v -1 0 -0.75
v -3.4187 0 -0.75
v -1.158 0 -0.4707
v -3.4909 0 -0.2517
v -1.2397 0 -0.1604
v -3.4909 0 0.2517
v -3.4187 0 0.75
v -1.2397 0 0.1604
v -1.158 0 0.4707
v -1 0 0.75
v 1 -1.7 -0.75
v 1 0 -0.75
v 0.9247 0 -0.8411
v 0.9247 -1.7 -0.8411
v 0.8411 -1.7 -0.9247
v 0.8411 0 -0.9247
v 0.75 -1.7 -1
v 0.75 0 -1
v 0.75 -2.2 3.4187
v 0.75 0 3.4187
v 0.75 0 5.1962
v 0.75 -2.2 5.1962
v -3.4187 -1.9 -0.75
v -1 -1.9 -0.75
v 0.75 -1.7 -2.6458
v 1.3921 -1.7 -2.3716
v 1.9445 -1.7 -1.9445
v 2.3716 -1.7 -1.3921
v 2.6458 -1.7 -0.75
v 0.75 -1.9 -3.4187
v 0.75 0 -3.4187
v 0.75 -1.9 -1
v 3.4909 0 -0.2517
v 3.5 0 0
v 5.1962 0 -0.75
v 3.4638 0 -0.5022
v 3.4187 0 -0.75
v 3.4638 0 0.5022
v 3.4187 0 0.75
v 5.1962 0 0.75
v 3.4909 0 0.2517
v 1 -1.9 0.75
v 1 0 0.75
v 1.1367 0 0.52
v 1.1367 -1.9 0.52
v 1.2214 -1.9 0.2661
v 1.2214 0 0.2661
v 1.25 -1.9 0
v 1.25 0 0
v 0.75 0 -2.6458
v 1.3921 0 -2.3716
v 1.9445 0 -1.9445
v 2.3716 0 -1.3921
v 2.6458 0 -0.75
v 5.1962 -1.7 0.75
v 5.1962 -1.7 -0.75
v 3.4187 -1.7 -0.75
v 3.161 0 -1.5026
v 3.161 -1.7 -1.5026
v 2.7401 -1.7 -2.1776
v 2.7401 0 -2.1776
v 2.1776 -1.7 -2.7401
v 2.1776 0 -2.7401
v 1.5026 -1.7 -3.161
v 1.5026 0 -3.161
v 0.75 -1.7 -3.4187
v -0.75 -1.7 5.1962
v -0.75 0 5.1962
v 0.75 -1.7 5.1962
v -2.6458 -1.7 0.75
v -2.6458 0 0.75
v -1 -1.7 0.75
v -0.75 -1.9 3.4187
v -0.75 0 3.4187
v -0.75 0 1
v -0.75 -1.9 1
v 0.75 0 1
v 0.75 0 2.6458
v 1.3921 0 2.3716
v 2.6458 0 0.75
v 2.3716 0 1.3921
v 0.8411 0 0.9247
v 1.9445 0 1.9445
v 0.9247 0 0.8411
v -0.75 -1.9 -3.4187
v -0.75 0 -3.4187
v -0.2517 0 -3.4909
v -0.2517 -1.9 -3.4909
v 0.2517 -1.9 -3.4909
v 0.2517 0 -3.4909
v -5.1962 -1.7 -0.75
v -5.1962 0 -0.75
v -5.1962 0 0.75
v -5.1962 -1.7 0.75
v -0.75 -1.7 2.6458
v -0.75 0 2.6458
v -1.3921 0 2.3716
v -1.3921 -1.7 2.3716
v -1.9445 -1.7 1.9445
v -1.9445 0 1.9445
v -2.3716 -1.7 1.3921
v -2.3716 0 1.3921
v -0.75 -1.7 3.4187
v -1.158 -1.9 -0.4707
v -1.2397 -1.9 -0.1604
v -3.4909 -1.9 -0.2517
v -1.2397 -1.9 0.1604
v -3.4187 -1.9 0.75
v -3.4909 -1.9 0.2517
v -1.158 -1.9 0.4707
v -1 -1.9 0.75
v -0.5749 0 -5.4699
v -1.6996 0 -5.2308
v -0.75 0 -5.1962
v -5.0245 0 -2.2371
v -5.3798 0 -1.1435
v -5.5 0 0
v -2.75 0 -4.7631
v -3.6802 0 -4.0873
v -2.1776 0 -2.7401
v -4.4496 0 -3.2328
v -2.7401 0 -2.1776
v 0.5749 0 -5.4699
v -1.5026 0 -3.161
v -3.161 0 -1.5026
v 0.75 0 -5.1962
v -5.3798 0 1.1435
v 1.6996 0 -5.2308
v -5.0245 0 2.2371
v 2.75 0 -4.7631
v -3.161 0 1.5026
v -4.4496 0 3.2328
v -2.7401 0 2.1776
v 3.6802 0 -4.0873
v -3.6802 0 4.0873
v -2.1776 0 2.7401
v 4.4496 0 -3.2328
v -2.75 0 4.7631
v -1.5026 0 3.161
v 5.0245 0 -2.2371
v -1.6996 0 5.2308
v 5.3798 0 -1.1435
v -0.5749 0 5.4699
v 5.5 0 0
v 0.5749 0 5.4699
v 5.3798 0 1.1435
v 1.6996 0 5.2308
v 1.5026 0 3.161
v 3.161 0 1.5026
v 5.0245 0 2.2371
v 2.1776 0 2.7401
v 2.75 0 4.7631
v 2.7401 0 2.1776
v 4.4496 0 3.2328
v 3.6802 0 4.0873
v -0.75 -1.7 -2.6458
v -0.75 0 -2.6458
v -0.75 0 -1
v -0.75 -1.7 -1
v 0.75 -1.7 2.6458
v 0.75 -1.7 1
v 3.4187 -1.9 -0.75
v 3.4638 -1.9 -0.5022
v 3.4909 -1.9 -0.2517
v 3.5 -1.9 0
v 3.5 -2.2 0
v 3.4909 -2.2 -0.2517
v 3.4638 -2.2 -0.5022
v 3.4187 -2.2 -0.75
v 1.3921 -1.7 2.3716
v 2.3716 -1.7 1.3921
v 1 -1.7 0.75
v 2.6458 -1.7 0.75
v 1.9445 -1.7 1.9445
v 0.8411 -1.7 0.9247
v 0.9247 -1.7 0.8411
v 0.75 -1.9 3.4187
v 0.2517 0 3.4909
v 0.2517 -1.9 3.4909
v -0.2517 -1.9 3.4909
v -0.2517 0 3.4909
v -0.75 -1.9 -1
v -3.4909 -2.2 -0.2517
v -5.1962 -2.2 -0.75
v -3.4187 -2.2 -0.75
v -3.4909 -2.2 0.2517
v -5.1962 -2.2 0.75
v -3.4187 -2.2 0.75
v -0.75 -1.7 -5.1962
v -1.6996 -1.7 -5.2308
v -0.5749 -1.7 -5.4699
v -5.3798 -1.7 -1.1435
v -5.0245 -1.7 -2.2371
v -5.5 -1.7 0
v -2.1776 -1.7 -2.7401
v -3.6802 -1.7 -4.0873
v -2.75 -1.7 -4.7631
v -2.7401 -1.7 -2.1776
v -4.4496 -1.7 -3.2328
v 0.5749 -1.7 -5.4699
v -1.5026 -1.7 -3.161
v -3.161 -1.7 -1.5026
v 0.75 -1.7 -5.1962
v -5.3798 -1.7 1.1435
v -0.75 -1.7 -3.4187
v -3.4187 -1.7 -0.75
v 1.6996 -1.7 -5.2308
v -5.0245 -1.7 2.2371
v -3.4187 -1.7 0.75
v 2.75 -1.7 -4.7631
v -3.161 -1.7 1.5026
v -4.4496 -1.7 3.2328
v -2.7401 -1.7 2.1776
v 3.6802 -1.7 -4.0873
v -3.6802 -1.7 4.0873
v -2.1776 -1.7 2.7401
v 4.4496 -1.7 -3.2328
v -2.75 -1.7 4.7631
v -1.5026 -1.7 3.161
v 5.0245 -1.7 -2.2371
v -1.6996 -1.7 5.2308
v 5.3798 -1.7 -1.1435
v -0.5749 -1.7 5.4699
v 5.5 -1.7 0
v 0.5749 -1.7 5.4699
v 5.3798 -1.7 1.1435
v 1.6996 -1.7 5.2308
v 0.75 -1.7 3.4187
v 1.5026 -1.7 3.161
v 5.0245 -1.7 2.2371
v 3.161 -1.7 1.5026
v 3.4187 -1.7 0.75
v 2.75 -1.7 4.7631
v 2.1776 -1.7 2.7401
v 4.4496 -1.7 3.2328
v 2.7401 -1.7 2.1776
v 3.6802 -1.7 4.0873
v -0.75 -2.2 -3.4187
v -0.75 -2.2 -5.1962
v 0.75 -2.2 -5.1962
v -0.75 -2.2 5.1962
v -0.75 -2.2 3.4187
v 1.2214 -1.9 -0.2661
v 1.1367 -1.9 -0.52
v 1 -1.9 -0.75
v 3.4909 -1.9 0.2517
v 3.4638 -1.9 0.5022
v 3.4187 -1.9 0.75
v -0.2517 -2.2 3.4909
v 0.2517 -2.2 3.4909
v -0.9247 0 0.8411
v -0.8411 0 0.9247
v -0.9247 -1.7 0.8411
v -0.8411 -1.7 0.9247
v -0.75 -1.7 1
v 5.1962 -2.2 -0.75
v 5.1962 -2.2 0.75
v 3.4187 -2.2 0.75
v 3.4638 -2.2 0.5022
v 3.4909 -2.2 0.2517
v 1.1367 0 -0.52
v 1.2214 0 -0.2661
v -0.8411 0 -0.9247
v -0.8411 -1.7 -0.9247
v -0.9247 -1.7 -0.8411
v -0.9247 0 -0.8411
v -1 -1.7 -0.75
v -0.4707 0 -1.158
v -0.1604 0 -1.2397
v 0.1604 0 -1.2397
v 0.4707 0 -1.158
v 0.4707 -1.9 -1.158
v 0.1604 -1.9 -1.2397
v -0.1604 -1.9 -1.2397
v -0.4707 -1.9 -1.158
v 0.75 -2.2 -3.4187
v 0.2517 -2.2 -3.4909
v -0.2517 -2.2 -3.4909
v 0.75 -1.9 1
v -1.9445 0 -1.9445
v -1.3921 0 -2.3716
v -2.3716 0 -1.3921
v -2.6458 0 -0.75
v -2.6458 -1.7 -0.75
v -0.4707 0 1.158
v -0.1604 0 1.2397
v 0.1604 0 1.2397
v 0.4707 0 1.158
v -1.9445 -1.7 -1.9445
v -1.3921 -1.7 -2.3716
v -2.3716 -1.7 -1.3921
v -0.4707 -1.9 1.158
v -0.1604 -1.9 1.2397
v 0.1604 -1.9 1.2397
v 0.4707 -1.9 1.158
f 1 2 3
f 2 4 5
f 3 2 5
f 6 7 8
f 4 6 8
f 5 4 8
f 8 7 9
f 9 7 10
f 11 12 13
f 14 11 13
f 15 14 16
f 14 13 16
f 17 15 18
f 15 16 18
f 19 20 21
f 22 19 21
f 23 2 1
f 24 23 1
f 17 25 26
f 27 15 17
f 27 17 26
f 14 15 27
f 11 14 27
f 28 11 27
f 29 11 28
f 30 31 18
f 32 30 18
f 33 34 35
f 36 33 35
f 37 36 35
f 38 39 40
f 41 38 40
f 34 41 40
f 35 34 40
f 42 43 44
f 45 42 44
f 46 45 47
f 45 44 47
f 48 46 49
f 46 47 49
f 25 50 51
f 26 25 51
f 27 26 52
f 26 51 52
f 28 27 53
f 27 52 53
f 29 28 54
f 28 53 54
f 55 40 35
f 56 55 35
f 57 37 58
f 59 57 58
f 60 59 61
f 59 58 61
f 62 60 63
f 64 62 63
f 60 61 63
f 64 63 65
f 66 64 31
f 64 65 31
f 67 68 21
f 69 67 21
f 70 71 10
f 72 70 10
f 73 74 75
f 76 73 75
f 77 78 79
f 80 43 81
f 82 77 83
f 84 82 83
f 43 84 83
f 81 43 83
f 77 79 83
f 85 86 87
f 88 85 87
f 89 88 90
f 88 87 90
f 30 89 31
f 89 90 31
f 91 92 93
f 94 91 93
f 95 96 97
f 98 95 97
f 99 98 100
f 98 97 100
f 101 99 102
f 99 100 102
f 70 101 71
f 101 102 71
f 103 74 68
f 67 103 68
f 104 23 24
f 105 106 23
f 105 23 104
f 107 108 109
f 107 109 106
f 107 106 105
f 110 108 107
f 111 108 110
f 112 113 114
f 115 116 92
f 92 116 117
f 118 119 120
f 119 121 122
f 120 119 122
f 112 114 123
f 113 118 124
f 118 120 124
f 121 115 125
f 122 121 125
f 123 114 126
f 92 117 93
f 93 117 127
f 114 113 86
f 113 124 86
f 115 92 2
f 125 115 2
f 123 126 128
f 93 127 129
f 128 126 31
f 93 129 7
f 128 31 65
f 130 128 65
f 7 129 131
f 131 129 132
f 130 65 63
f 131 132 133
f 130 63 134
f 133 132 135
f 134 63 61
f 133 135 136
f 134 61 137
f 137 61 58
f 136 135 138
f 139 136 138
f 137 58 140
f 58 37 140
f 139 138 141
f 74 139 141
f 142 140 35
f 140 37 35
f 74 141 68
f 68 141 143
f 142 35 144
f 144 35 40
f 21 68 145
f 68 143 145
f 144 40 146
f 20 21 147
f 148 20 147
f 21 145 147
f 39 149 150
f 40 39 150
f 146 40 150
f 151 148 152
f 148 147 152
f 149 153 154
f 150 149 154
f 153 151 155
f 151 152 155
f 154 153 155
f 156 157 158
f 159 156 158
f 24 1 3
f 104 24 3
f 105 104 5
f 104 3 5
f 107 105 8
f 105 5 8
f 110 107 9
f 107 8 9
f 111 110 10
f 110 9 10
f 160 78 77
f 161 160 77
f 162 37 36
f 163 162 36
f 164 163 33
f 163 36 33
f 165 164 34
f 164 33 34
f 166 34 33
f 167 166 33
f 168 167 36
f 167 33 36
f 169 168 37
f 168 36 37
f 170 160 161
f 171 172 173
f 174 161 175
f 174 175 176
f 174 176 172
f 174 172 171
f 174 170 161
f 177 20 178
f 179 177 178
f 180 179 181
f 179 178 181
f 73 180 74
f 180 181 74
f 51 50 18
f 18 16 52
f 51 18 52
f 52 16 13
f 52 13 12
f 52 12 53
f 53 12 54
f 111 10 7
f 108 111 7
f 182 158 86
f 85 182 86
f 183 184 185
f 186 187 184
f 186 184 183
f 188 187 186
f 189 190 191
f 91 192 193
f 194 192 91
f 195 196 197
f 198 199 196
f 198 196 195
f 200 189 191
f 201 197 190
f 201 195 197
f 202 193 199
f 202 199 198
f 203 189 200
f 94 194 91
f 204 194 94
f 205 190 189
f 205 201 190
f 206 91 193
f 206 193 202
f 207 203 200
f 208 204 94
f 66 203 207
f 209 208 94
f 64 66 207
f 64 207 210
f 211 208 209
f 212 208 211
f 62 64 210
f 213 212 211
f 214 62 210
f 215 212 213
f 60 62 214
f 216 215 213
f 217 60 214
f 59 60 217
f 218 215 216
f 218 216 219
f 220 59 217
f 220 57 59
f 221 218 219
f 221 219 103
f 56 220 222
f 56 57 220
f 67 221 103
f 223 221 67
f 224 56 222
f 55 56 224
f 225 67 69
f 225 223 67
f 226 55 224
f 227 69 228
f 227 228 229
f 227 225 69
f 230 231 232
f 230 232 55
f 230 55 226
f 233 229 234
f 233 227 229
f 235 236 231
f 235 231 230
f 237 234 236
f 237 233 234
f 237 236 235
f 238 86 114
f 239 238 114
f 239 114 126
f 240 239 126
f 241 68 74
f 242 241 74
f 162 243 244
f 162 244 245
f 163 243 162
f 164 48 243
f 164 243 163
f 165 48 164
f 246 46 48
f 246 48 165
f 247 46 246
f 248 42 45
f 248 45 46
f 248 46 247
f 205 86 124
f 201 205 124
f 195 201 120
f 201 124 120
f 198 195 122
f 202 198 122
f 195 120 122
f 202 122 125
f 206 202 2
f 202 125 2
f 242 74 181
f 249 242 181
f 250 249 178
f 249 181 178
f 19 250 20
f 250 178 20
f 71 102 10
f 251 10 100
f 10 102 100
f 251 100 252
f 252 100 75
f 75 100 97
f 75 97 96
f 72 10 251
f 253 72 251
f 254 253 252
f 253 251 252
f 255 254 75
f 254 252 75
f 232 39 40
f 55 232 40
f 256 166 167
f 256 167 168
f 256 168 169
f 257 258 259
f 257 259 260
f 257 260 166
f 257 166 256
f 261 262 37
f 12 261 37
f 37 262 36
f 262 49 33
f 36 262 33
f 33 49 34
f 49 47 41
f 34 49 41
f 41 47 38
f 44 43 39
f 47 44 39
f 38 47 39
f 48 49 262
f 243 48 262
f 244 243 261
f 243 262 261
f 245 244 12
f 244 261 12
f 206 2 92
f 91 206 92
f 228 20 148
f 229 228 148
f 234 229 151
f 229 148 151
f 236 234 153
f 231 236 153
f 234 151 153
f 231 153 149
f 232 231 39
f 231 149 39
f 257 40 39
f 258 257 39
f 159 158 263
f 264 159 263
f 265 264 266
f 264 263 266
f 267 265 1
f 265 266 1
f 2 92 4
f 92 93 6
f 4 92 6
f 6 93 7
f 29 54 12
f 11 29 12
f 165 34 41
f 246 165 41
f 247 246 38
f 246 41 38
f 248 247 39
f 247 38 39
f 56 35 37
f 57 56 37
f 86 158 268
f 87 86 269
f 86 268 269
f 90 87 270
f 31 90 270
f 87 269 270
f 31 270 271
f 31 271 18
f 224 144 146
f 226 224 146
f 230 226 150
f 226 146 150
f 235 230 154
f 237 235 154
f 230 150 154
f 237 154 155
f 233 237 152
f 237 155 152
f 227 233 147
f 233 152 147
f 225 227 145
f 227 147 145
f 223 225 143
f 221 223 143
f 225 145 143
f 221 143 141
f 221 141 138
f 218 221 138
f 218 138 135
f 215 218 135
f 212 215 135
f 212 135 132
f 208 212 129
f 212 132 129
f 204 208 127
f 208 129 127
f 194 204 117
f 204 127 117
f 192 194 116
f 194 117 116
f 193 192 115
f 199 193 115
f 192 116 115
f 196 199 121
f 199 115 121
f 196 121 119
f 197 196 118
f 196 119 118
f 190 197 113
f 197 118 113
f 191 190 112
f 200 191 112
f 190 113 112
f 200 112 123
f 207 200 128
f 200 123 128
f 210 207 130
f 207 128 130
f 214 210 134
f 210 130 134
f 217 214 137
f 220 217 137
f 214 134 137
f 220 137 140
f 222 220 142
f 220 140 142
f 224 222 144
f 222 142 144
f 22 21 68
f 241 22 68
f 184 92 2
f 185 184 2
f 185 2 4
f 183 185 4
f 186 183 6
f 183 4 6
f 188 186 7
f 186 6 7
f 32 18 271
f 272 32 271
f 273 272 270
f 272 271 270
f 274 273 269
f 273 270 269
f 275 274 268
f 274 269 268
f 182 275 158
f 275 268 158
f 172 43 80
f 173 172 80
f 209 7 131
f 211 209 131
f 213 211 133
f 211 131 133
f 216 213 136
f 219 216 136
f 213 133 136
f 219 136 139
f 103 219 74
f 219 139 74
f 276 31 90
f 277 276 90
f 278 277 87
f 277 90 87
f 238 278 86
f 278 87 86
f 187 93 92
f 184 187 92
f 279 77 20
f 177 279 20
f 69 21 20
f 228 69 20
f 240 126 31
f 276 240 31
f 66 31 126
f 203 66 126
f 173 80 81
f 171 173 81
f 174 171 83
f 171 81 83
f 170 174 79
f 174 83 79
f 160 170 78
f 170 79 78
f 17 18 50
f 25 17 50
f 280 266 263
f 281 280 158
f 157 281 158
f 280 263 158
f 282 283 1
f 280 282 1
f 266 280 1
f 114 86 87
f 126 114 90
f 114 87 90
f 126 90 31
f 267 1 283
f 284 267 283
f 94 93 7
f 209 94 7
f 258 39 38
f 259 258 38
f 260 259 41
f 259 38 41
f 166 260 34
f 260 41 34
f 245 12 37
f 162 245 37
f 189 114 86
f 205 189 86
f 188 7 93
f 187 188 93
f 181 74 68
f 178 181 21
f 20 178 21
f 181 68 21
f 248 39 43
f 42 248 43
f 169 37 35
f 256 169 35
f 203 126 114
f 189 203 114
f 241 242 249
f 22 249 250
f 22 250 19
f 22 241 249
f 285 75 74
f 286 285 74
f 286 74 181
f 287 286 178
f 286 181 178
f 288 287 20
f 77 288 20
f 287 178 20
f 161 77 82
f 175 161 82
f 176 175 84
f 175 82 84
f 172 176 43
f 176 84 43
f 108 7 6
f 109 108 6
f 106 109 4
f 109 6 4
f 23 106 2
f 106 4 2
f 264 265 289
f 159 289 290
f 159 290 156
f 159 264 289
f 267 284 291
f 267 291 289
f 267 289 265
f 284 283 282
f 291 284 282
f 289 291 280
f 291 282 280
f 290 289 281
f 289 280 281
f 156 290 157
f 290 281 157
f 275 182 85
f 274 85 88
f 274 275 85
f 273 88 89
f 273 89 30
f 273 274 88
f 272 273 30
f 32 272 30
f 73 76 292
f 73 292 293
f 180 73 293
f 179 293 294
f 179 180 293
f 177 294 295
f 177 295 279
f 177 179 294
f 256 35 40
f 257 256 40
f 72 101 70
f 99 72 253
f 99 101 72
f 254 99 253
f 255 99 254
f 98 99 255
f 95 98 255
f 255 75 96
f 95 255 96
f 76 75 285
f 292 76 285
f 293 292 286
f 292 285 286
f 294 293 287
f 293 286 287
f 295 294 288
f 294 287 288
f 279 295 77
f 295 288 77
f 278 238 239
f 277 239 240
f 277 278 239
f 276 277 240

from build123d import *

# Parameters (mm, degrees)
F1_DEPTH = 1.7
F0_R     = 5.5
F2_DEPTH = 1.9
F3_DEPTH = 2.2


with BuildPart() as f1:
    # F0 (on Front) → F1 (new body)
    with BuildSketch(Plane.XZ):
        with BuildLine():
            ThreePointArc((0.75, 1), (0.8838834765, 0.8838834765), (1, 0.75))
            Line((1, 0.75), (2.6457513111, 0.75))
            ThreePointArc((2.6457513111, 0.75), (1.9445436483, 1.9445436483), (0.75, 2.6457513111))
            Line((0.75, 2.6457513111), (0.75, 1))
        make_face()
    extrude(amount=F1_DEPTH)


with BuildPart() as f1b:
    # F0 (on Front) → F1, piece 2 (new body)
    with BuildSketch(Plane.XZ):
        Circle(F0_R)
        with BuildLine():
            ThreePointArc((0.75, 5.1961524227), (3.7123106012, 3.7123106012), (5.1961524227, 0.75))
            ThreePointArc((5.1961524227, 0.75), (5.236520802, 0.3759652782), (5.25, 0))
            ThreePointArc((5.25, 0), (5.236520802, -0.3759652782), (5.1961524227, -0.75))
            ThreePointArc((5.1961524227, -0.75), (3.7123106012, -3.7123106012), (0.75, -5.1961524227))
            ThreePointArc((0.75, -5.1961524227), (0, -5.25), (-0.75, -5.1961524227))
            ThreePointArc((-0.75, -5.1961524227), (-3.7123106012, -3.7123106012), (-5.1961524227, -0.75))
            ThreePointArc((-5.1961524227, -0.75), (-5.25, 0), (-5.1961524227, 0.75))
            ThreePointArc((-5.1961524227, 0.75), (-3.7123106012, 3.7123106012), (-0.75, 5.1961524227))
            ThreePointArc((-0.75, 5.1961524227), (0, 5.25), (0.75, 5.1961524227))
        make_face(mode=Mode.SUBTRACT)
        with BuildLine():
            ThreePointArc((0.75, 3.4186985828), (2.4748737342, 2.4748737342), (3.4186985828, 0.75))
            Line((3.4186985828, 0.75), (5.1961524227, 0.75))
            ThreePointArc((5.1961524227, 0.75), (3.7123106012, 3.7123106012), (0.75, 5.1961524227))
            Line((0.75, 5.1961524227), (0.75, 3.4186985828))
        make_face()
        with BuildLine():
            Line((-0.75, -5.1961524227), (-0.75, -3.4186985828))
            ThreePointArc((-0.75, -3.4186985828), (-2.4748737342, -2.4748737342), (-3.4186985828, -0.75))
            Line((-3.4186985828, -0.75), (-5.1961524227, -0.75))
            ThreePointArc((-5.1961524227, -0.75), (-3.7123106012, -3.7123106012), (-0.75, -5.1961524227))
        make_face()
        with BuildLine():
            ThreePointArc((-3.4186985828, 0.75), (-2.4748737342, 2.4748737342), (-0.75, 3.4186985828))
            Line((-0.75, 3.4186985828), (-0.75, 5.1961524227))
            ThreePointArc((-0.75, 5.1961524227), (-3.7123106012, 3.7123106012), (-5.1961524227, 0.75))
            Line((-5.1961524227, 0.75), (-3.4186985828, 0.75))
        make_face()
        with BuildLine():
            Line((5.1961524227, -0.75), (3.4186985828, -0.75))
            ThreePointArc((3.4186985828, -0.75), (2.4748737342, -2.4748737342), (0.75, -3.4186985828))
            Line((0.75, -3.4186985828), (0.75, -5.1961524227))
            ThreePointArc((0.75, -5.1961524227), (3.7123106012, -3.7123106012), (5.1961524227, -0.75))
        make_face()
        with BuildLine():
            Line((-0.75, 5.1961524227), (0.75, 5.1961524227))
            ThreePointArc((0.75, 5.1961524227), (0, 5.25), (-0.75, 5.1961524227))
        make_face()
        with BuildLine():
            ThreePointArc((-0.75, -5.1961524227), (0, -5.25), (0.75, -5.1961524227))
            Line((0.75, -5.1961524227), (-0.75, -5.1961524227))
        make_face()
        with BuildLine():
            ThreePointArc((5.25, 0), (5.236520802, 0.3759652782), (5.1961524227, 0.75))
            Line((5.1961524227, 0.75), (5.1961524227, -0.75))
            ThreePointArc((5.1961524227, -0.75), (5.236520802, -0.3759652782), (5.25, 0))
        make_face()
        with BuildLine():
            Line((-5.1961524227, -0.75), (-5.1961524227, 0.75))
            ThreePointArc((-5.1961524227, 0.75), (-5.25, 0), (-5.1961524227, -0.75))
        make_face()
    extrude(amount=F1_DEPTH)


with BuildPart() as f1c:
    # F0 (on Front) → F1, piece 3 (new body)
    with BuildSketch(Plane.XZ):
        with BuildLine():
            ThreePointArc((-1, 0.75), (-0.8838834765, 0.8838834765), (-0.75, 1))
            Line((-0.75, 1), (-0.75, 2.6457513111))
            ThreePointArc((-0.75, 2.6457513111), (-1.9445436483, 1.9445436483), (-2.6457513111, 0.75))
            Line((-2.6457513111, 0.75), (-1, 0.75))
        make_face()
    extrude(amount=F1_DEPTH)


with BuildPart() as f1d:
    # F0 (on Front) → F1, piece 4 (new body)
    with BuildSketch(Plane.XZ):
        with BuildLine():
            Line((-0.75, -2.6457513111), (-0.75, -1))
            ThreePointArc((-0.75, -1), (-0.8838834765, -0.8838834765), (-1, -0.75))
            Line((-1, -0.75), (-2.6457513111, -0.75))
            ThreePointArc((-2.6457513111, -0.75), (-1.9445436483, -1.9445436483), (-0.75, -2.6457513111))
        make_face()
    extrude(amount=F1_DEPTH)


with BuildPart() as f1e:
    # F0 (on Front) → F1, piece 5 (new body)
    with BuildSketch(Plane.XZ):
        with BuildLine():
            Line((2.6457513111, -0.75), (1, -0.75))
            ThreePointArc((1, -0.75), (0.8838834765, -0.8838834765), (0.75, -1))
            Line((0.75, -1), (0.75, -2.6457513111))
            ThreePointArc((0.75, -2.6457513111), (1.9445436483, -1.9445436483), (2.6457513111, -0.75))
        make_face()
    extrude(amount=F1_DEPTH)


with BuildPart() as f2:
    # F0 (on Front) → F2 (new body)
    with BuildSketch(Plane.XZ):
        with BuildLine():
            ThreePointArc((-2.6457513111, -0.75), (-2.75, 0), (-2.6457513111, 0.75))
            Line((-2.6457513111, 0.75), (-3.4186985828, 0.75))
            ThreePointArc((-3.4186985828, 0.75), (-3.5, 0), (-3.4186985828, -0.75))
            Line((-3.4186985828, -0.75), (-2.6457513111, -0.75))
        make_face()
        with BuildLine():
            ThreePointArc((-1, -0.75), (-1.25, 0), (-1, 0.75))
            Line((-1, 0.75), (-2.6457513111, 0.75))
            ThreePointArc((-2.6457513111, 0.75), (-2.75, 0), (-2.6457513111, -0.75))
            Line((-2.6457513111, -0.75), (-1, -0.75))
        make_face()
    extrude(amount=F2_DEPTH)


with BuildPart() as f2b:
    # F0 (on Front) → F2, piece 2 (new body)
    with BuildSketch(Plane.XZ):
        with BuildLine():
            ThreePointArc((-0.75, 1), (0, 1.25), (0.75, 1))
            Line((0.75, 1), (0.75, 2.6457513111))
            ThreePointArc((0.75, 2.6457513111), (0, 2.75), (-0.75, 2.6457513111))
            Line((-0.75, 2.6457513111), (-0.75, 1))
        make_face()
        with BuildLine():
            ThreePointArc((-0.75, 2.6457513111), (0, 2.75), (0.75, 2.6457513111))
            Line((0.75, 2.6457513111), (0.75, 3.4186985828))
            ThreePointArc((0.75, 3.4186985828), (0, 3.5), (-0.75, 3.4186985828))
            Line((-0.75, 3.4186985828), (-0.75, 2.6457513111))
        make_face()
    extrude(amount=F2_DEPTH)


with BuildPart() as f2c:
    # F0 (on Front) → F2, piece 3 (new body)
    with BuildSketch(Plane.XZ):
        with BuildLine():
            Line((3.4186985828, 0.75), (2.6457513111, 0.75))
            ThreePointArc((2.6457513111, 0.75), (2.7238131457, 0.3786052658), (2.75, 0))
            ThreePointArc((2.75, 0), (2.7238131457, -0.3786052658), (2.6457513111, -0.75))
            Line((2.6457513111, -0.75), (3.4186985828, -0.75))
            ThreePointArc((3.4186985828, -0.75), (3.4796152833, -0.3771968718), (3.5, 0))
            ThreePointArc((3.5, 0), (3.4796152833, 0.3771968718), (3.4186985828, 0.75))
        make_face()
        with BuildLine():
            ThreePointArc((1, 0.75), (1.1858541226, 0.3952847075), (1.25, 0))
            ThreePointArc((1.25, 0), (1.1858541226, -0.3952847075), (1, -0.75))
            Line((1, -0.75), (2.6457513111, -0.75))
            ThreePointArc((2.6457513111, -0.75), (2.7238131457, -0.3786052658), (2.75, 0))
            ThreePointArc((2.75, 0), (2.7238131457, 0.3786052658), (2.6457513111, 0.75))
            Line((2.6457513111, 0.75), (1, 0.75))
        make_face()
    extrude(amount=F2_DEPTH)


with BuildPart() as f2d:
    # F0 (on Front) → F2, piece 4 (new body)
    with BuildSketch(Plane.XZ):
        with BuildLine():
            Line((0.75, -3.4186985828), (0.75, -2.6457513111))
            ThreePointArc((0.75, -2.6457513111), (0, -2.75), (-0.75, -2.6457513111))
            Line((-0.75, -2.6457513111), (-0.75, -3.4186985828))
            ThreePointArc((-0.75, -3.4186985828), (0, -3.5), (0.75, -3.4186985828))
        make_face()
        with BuildLine():
            Line((0.75, -2.6457513111), (0.75, -1))
            ThreePointArc((0.75, -1), (0, -1.25), (-0.75, -1))
            Line((-0.75, -1), (-0.75, -2.6457513111))
            ThreePointArc((-0.75, -2.6457513111), (0, -2.75), (0.75, -2.6457513111))
        make_face()
    extrude(amount=F2_DEPTH)


with BuildPart() as f3:
    # F0 (on Front) → F3 (new body)
    with BuildSketch(Plane.XZ):
        with BuildLine():
            ThreePointArc((-3.4186985828, -0.75), (-3.5, 0), (-3.4186985828, 0.75))
            Line((-3.4186985828, 0.75), (-5.1961524227, 0.75))
            Line((-5.1961524227, 0.75), (-5.1961524227, -0.75))
            Line((-5.1961524227, -0.75), (-3.4186985828, -0.75))
        make_face()
    extrude(amount=F3_DEPTH)


with BuildPart() as f3b:
    # F0 (on Front) → F3, piece 2 (new body)
    with BuildSketch(Plane.XZ):
        with BuildLine():
            ThreePointArc((-0.75, 3.4186985828), (0, 3.5), (0.75, 3.4186985828))
            Line((0.75, 3.4186985828), (0.75, 5.1961524227))
            Line((0.75, 5.1961524227), (-0.75, 5.1961524227))
            Line((-0.75, 5.1961524227), (-0.75, 3.4186985828))
        make_face()
    extrude(amount=F3_DEPTH)


with BuildPart() as f3c:
    # F0 (on Front) → F3, piece 3 (new body)
    with BuildSketch(Plane.XZ):
        with BuildLine():
            Line((5.1961524227, 0.75), (3.4186985828, 0.75))
            ThreePointArc((3.4186985828, 0.75), (3.4796152833, 0.3771968718), (3.5, 0))
            ThreePointArc((3.5, 0), (3.4796152833, -0.3771968718), (3.4186985828, -0.75))
            Line((3.4186985828, -0.75), (5.1961524227, -0.75))
            Line((5.1961524227, -0.75), (5.1961524227, 0.75))
        make_face()
    extrude(amount=F3_DEPTH)


with BuildPart() as f3d:
    # F0 (on Front) → F3, piece 4 (new body)
    with BuildSketch(Plane.XZ):
        with BuildLine():
            Line((0.75, -5.1961524227), (0.75, -3.4186985828))
            ThreePointArc((0.75, -3.4186985828), (0, -3.5), (-0.75, -3.4186985828))
            Line((-0.75, -3.4186985828), (-0.75, -5.1961524227))
            Line((-0.75, -5.1961524227), (0.75, -5.1961524227))
        make_face()
    extrude(amount=F3_DEPTH)


solid = Compound([f1.part, f1b.part, f1c.part, f1d.part, f1e.part, f2.part, f2b.part, f2c.part, f2d.part, f3.part, f3b.part, f3c.part, f3d.part])
